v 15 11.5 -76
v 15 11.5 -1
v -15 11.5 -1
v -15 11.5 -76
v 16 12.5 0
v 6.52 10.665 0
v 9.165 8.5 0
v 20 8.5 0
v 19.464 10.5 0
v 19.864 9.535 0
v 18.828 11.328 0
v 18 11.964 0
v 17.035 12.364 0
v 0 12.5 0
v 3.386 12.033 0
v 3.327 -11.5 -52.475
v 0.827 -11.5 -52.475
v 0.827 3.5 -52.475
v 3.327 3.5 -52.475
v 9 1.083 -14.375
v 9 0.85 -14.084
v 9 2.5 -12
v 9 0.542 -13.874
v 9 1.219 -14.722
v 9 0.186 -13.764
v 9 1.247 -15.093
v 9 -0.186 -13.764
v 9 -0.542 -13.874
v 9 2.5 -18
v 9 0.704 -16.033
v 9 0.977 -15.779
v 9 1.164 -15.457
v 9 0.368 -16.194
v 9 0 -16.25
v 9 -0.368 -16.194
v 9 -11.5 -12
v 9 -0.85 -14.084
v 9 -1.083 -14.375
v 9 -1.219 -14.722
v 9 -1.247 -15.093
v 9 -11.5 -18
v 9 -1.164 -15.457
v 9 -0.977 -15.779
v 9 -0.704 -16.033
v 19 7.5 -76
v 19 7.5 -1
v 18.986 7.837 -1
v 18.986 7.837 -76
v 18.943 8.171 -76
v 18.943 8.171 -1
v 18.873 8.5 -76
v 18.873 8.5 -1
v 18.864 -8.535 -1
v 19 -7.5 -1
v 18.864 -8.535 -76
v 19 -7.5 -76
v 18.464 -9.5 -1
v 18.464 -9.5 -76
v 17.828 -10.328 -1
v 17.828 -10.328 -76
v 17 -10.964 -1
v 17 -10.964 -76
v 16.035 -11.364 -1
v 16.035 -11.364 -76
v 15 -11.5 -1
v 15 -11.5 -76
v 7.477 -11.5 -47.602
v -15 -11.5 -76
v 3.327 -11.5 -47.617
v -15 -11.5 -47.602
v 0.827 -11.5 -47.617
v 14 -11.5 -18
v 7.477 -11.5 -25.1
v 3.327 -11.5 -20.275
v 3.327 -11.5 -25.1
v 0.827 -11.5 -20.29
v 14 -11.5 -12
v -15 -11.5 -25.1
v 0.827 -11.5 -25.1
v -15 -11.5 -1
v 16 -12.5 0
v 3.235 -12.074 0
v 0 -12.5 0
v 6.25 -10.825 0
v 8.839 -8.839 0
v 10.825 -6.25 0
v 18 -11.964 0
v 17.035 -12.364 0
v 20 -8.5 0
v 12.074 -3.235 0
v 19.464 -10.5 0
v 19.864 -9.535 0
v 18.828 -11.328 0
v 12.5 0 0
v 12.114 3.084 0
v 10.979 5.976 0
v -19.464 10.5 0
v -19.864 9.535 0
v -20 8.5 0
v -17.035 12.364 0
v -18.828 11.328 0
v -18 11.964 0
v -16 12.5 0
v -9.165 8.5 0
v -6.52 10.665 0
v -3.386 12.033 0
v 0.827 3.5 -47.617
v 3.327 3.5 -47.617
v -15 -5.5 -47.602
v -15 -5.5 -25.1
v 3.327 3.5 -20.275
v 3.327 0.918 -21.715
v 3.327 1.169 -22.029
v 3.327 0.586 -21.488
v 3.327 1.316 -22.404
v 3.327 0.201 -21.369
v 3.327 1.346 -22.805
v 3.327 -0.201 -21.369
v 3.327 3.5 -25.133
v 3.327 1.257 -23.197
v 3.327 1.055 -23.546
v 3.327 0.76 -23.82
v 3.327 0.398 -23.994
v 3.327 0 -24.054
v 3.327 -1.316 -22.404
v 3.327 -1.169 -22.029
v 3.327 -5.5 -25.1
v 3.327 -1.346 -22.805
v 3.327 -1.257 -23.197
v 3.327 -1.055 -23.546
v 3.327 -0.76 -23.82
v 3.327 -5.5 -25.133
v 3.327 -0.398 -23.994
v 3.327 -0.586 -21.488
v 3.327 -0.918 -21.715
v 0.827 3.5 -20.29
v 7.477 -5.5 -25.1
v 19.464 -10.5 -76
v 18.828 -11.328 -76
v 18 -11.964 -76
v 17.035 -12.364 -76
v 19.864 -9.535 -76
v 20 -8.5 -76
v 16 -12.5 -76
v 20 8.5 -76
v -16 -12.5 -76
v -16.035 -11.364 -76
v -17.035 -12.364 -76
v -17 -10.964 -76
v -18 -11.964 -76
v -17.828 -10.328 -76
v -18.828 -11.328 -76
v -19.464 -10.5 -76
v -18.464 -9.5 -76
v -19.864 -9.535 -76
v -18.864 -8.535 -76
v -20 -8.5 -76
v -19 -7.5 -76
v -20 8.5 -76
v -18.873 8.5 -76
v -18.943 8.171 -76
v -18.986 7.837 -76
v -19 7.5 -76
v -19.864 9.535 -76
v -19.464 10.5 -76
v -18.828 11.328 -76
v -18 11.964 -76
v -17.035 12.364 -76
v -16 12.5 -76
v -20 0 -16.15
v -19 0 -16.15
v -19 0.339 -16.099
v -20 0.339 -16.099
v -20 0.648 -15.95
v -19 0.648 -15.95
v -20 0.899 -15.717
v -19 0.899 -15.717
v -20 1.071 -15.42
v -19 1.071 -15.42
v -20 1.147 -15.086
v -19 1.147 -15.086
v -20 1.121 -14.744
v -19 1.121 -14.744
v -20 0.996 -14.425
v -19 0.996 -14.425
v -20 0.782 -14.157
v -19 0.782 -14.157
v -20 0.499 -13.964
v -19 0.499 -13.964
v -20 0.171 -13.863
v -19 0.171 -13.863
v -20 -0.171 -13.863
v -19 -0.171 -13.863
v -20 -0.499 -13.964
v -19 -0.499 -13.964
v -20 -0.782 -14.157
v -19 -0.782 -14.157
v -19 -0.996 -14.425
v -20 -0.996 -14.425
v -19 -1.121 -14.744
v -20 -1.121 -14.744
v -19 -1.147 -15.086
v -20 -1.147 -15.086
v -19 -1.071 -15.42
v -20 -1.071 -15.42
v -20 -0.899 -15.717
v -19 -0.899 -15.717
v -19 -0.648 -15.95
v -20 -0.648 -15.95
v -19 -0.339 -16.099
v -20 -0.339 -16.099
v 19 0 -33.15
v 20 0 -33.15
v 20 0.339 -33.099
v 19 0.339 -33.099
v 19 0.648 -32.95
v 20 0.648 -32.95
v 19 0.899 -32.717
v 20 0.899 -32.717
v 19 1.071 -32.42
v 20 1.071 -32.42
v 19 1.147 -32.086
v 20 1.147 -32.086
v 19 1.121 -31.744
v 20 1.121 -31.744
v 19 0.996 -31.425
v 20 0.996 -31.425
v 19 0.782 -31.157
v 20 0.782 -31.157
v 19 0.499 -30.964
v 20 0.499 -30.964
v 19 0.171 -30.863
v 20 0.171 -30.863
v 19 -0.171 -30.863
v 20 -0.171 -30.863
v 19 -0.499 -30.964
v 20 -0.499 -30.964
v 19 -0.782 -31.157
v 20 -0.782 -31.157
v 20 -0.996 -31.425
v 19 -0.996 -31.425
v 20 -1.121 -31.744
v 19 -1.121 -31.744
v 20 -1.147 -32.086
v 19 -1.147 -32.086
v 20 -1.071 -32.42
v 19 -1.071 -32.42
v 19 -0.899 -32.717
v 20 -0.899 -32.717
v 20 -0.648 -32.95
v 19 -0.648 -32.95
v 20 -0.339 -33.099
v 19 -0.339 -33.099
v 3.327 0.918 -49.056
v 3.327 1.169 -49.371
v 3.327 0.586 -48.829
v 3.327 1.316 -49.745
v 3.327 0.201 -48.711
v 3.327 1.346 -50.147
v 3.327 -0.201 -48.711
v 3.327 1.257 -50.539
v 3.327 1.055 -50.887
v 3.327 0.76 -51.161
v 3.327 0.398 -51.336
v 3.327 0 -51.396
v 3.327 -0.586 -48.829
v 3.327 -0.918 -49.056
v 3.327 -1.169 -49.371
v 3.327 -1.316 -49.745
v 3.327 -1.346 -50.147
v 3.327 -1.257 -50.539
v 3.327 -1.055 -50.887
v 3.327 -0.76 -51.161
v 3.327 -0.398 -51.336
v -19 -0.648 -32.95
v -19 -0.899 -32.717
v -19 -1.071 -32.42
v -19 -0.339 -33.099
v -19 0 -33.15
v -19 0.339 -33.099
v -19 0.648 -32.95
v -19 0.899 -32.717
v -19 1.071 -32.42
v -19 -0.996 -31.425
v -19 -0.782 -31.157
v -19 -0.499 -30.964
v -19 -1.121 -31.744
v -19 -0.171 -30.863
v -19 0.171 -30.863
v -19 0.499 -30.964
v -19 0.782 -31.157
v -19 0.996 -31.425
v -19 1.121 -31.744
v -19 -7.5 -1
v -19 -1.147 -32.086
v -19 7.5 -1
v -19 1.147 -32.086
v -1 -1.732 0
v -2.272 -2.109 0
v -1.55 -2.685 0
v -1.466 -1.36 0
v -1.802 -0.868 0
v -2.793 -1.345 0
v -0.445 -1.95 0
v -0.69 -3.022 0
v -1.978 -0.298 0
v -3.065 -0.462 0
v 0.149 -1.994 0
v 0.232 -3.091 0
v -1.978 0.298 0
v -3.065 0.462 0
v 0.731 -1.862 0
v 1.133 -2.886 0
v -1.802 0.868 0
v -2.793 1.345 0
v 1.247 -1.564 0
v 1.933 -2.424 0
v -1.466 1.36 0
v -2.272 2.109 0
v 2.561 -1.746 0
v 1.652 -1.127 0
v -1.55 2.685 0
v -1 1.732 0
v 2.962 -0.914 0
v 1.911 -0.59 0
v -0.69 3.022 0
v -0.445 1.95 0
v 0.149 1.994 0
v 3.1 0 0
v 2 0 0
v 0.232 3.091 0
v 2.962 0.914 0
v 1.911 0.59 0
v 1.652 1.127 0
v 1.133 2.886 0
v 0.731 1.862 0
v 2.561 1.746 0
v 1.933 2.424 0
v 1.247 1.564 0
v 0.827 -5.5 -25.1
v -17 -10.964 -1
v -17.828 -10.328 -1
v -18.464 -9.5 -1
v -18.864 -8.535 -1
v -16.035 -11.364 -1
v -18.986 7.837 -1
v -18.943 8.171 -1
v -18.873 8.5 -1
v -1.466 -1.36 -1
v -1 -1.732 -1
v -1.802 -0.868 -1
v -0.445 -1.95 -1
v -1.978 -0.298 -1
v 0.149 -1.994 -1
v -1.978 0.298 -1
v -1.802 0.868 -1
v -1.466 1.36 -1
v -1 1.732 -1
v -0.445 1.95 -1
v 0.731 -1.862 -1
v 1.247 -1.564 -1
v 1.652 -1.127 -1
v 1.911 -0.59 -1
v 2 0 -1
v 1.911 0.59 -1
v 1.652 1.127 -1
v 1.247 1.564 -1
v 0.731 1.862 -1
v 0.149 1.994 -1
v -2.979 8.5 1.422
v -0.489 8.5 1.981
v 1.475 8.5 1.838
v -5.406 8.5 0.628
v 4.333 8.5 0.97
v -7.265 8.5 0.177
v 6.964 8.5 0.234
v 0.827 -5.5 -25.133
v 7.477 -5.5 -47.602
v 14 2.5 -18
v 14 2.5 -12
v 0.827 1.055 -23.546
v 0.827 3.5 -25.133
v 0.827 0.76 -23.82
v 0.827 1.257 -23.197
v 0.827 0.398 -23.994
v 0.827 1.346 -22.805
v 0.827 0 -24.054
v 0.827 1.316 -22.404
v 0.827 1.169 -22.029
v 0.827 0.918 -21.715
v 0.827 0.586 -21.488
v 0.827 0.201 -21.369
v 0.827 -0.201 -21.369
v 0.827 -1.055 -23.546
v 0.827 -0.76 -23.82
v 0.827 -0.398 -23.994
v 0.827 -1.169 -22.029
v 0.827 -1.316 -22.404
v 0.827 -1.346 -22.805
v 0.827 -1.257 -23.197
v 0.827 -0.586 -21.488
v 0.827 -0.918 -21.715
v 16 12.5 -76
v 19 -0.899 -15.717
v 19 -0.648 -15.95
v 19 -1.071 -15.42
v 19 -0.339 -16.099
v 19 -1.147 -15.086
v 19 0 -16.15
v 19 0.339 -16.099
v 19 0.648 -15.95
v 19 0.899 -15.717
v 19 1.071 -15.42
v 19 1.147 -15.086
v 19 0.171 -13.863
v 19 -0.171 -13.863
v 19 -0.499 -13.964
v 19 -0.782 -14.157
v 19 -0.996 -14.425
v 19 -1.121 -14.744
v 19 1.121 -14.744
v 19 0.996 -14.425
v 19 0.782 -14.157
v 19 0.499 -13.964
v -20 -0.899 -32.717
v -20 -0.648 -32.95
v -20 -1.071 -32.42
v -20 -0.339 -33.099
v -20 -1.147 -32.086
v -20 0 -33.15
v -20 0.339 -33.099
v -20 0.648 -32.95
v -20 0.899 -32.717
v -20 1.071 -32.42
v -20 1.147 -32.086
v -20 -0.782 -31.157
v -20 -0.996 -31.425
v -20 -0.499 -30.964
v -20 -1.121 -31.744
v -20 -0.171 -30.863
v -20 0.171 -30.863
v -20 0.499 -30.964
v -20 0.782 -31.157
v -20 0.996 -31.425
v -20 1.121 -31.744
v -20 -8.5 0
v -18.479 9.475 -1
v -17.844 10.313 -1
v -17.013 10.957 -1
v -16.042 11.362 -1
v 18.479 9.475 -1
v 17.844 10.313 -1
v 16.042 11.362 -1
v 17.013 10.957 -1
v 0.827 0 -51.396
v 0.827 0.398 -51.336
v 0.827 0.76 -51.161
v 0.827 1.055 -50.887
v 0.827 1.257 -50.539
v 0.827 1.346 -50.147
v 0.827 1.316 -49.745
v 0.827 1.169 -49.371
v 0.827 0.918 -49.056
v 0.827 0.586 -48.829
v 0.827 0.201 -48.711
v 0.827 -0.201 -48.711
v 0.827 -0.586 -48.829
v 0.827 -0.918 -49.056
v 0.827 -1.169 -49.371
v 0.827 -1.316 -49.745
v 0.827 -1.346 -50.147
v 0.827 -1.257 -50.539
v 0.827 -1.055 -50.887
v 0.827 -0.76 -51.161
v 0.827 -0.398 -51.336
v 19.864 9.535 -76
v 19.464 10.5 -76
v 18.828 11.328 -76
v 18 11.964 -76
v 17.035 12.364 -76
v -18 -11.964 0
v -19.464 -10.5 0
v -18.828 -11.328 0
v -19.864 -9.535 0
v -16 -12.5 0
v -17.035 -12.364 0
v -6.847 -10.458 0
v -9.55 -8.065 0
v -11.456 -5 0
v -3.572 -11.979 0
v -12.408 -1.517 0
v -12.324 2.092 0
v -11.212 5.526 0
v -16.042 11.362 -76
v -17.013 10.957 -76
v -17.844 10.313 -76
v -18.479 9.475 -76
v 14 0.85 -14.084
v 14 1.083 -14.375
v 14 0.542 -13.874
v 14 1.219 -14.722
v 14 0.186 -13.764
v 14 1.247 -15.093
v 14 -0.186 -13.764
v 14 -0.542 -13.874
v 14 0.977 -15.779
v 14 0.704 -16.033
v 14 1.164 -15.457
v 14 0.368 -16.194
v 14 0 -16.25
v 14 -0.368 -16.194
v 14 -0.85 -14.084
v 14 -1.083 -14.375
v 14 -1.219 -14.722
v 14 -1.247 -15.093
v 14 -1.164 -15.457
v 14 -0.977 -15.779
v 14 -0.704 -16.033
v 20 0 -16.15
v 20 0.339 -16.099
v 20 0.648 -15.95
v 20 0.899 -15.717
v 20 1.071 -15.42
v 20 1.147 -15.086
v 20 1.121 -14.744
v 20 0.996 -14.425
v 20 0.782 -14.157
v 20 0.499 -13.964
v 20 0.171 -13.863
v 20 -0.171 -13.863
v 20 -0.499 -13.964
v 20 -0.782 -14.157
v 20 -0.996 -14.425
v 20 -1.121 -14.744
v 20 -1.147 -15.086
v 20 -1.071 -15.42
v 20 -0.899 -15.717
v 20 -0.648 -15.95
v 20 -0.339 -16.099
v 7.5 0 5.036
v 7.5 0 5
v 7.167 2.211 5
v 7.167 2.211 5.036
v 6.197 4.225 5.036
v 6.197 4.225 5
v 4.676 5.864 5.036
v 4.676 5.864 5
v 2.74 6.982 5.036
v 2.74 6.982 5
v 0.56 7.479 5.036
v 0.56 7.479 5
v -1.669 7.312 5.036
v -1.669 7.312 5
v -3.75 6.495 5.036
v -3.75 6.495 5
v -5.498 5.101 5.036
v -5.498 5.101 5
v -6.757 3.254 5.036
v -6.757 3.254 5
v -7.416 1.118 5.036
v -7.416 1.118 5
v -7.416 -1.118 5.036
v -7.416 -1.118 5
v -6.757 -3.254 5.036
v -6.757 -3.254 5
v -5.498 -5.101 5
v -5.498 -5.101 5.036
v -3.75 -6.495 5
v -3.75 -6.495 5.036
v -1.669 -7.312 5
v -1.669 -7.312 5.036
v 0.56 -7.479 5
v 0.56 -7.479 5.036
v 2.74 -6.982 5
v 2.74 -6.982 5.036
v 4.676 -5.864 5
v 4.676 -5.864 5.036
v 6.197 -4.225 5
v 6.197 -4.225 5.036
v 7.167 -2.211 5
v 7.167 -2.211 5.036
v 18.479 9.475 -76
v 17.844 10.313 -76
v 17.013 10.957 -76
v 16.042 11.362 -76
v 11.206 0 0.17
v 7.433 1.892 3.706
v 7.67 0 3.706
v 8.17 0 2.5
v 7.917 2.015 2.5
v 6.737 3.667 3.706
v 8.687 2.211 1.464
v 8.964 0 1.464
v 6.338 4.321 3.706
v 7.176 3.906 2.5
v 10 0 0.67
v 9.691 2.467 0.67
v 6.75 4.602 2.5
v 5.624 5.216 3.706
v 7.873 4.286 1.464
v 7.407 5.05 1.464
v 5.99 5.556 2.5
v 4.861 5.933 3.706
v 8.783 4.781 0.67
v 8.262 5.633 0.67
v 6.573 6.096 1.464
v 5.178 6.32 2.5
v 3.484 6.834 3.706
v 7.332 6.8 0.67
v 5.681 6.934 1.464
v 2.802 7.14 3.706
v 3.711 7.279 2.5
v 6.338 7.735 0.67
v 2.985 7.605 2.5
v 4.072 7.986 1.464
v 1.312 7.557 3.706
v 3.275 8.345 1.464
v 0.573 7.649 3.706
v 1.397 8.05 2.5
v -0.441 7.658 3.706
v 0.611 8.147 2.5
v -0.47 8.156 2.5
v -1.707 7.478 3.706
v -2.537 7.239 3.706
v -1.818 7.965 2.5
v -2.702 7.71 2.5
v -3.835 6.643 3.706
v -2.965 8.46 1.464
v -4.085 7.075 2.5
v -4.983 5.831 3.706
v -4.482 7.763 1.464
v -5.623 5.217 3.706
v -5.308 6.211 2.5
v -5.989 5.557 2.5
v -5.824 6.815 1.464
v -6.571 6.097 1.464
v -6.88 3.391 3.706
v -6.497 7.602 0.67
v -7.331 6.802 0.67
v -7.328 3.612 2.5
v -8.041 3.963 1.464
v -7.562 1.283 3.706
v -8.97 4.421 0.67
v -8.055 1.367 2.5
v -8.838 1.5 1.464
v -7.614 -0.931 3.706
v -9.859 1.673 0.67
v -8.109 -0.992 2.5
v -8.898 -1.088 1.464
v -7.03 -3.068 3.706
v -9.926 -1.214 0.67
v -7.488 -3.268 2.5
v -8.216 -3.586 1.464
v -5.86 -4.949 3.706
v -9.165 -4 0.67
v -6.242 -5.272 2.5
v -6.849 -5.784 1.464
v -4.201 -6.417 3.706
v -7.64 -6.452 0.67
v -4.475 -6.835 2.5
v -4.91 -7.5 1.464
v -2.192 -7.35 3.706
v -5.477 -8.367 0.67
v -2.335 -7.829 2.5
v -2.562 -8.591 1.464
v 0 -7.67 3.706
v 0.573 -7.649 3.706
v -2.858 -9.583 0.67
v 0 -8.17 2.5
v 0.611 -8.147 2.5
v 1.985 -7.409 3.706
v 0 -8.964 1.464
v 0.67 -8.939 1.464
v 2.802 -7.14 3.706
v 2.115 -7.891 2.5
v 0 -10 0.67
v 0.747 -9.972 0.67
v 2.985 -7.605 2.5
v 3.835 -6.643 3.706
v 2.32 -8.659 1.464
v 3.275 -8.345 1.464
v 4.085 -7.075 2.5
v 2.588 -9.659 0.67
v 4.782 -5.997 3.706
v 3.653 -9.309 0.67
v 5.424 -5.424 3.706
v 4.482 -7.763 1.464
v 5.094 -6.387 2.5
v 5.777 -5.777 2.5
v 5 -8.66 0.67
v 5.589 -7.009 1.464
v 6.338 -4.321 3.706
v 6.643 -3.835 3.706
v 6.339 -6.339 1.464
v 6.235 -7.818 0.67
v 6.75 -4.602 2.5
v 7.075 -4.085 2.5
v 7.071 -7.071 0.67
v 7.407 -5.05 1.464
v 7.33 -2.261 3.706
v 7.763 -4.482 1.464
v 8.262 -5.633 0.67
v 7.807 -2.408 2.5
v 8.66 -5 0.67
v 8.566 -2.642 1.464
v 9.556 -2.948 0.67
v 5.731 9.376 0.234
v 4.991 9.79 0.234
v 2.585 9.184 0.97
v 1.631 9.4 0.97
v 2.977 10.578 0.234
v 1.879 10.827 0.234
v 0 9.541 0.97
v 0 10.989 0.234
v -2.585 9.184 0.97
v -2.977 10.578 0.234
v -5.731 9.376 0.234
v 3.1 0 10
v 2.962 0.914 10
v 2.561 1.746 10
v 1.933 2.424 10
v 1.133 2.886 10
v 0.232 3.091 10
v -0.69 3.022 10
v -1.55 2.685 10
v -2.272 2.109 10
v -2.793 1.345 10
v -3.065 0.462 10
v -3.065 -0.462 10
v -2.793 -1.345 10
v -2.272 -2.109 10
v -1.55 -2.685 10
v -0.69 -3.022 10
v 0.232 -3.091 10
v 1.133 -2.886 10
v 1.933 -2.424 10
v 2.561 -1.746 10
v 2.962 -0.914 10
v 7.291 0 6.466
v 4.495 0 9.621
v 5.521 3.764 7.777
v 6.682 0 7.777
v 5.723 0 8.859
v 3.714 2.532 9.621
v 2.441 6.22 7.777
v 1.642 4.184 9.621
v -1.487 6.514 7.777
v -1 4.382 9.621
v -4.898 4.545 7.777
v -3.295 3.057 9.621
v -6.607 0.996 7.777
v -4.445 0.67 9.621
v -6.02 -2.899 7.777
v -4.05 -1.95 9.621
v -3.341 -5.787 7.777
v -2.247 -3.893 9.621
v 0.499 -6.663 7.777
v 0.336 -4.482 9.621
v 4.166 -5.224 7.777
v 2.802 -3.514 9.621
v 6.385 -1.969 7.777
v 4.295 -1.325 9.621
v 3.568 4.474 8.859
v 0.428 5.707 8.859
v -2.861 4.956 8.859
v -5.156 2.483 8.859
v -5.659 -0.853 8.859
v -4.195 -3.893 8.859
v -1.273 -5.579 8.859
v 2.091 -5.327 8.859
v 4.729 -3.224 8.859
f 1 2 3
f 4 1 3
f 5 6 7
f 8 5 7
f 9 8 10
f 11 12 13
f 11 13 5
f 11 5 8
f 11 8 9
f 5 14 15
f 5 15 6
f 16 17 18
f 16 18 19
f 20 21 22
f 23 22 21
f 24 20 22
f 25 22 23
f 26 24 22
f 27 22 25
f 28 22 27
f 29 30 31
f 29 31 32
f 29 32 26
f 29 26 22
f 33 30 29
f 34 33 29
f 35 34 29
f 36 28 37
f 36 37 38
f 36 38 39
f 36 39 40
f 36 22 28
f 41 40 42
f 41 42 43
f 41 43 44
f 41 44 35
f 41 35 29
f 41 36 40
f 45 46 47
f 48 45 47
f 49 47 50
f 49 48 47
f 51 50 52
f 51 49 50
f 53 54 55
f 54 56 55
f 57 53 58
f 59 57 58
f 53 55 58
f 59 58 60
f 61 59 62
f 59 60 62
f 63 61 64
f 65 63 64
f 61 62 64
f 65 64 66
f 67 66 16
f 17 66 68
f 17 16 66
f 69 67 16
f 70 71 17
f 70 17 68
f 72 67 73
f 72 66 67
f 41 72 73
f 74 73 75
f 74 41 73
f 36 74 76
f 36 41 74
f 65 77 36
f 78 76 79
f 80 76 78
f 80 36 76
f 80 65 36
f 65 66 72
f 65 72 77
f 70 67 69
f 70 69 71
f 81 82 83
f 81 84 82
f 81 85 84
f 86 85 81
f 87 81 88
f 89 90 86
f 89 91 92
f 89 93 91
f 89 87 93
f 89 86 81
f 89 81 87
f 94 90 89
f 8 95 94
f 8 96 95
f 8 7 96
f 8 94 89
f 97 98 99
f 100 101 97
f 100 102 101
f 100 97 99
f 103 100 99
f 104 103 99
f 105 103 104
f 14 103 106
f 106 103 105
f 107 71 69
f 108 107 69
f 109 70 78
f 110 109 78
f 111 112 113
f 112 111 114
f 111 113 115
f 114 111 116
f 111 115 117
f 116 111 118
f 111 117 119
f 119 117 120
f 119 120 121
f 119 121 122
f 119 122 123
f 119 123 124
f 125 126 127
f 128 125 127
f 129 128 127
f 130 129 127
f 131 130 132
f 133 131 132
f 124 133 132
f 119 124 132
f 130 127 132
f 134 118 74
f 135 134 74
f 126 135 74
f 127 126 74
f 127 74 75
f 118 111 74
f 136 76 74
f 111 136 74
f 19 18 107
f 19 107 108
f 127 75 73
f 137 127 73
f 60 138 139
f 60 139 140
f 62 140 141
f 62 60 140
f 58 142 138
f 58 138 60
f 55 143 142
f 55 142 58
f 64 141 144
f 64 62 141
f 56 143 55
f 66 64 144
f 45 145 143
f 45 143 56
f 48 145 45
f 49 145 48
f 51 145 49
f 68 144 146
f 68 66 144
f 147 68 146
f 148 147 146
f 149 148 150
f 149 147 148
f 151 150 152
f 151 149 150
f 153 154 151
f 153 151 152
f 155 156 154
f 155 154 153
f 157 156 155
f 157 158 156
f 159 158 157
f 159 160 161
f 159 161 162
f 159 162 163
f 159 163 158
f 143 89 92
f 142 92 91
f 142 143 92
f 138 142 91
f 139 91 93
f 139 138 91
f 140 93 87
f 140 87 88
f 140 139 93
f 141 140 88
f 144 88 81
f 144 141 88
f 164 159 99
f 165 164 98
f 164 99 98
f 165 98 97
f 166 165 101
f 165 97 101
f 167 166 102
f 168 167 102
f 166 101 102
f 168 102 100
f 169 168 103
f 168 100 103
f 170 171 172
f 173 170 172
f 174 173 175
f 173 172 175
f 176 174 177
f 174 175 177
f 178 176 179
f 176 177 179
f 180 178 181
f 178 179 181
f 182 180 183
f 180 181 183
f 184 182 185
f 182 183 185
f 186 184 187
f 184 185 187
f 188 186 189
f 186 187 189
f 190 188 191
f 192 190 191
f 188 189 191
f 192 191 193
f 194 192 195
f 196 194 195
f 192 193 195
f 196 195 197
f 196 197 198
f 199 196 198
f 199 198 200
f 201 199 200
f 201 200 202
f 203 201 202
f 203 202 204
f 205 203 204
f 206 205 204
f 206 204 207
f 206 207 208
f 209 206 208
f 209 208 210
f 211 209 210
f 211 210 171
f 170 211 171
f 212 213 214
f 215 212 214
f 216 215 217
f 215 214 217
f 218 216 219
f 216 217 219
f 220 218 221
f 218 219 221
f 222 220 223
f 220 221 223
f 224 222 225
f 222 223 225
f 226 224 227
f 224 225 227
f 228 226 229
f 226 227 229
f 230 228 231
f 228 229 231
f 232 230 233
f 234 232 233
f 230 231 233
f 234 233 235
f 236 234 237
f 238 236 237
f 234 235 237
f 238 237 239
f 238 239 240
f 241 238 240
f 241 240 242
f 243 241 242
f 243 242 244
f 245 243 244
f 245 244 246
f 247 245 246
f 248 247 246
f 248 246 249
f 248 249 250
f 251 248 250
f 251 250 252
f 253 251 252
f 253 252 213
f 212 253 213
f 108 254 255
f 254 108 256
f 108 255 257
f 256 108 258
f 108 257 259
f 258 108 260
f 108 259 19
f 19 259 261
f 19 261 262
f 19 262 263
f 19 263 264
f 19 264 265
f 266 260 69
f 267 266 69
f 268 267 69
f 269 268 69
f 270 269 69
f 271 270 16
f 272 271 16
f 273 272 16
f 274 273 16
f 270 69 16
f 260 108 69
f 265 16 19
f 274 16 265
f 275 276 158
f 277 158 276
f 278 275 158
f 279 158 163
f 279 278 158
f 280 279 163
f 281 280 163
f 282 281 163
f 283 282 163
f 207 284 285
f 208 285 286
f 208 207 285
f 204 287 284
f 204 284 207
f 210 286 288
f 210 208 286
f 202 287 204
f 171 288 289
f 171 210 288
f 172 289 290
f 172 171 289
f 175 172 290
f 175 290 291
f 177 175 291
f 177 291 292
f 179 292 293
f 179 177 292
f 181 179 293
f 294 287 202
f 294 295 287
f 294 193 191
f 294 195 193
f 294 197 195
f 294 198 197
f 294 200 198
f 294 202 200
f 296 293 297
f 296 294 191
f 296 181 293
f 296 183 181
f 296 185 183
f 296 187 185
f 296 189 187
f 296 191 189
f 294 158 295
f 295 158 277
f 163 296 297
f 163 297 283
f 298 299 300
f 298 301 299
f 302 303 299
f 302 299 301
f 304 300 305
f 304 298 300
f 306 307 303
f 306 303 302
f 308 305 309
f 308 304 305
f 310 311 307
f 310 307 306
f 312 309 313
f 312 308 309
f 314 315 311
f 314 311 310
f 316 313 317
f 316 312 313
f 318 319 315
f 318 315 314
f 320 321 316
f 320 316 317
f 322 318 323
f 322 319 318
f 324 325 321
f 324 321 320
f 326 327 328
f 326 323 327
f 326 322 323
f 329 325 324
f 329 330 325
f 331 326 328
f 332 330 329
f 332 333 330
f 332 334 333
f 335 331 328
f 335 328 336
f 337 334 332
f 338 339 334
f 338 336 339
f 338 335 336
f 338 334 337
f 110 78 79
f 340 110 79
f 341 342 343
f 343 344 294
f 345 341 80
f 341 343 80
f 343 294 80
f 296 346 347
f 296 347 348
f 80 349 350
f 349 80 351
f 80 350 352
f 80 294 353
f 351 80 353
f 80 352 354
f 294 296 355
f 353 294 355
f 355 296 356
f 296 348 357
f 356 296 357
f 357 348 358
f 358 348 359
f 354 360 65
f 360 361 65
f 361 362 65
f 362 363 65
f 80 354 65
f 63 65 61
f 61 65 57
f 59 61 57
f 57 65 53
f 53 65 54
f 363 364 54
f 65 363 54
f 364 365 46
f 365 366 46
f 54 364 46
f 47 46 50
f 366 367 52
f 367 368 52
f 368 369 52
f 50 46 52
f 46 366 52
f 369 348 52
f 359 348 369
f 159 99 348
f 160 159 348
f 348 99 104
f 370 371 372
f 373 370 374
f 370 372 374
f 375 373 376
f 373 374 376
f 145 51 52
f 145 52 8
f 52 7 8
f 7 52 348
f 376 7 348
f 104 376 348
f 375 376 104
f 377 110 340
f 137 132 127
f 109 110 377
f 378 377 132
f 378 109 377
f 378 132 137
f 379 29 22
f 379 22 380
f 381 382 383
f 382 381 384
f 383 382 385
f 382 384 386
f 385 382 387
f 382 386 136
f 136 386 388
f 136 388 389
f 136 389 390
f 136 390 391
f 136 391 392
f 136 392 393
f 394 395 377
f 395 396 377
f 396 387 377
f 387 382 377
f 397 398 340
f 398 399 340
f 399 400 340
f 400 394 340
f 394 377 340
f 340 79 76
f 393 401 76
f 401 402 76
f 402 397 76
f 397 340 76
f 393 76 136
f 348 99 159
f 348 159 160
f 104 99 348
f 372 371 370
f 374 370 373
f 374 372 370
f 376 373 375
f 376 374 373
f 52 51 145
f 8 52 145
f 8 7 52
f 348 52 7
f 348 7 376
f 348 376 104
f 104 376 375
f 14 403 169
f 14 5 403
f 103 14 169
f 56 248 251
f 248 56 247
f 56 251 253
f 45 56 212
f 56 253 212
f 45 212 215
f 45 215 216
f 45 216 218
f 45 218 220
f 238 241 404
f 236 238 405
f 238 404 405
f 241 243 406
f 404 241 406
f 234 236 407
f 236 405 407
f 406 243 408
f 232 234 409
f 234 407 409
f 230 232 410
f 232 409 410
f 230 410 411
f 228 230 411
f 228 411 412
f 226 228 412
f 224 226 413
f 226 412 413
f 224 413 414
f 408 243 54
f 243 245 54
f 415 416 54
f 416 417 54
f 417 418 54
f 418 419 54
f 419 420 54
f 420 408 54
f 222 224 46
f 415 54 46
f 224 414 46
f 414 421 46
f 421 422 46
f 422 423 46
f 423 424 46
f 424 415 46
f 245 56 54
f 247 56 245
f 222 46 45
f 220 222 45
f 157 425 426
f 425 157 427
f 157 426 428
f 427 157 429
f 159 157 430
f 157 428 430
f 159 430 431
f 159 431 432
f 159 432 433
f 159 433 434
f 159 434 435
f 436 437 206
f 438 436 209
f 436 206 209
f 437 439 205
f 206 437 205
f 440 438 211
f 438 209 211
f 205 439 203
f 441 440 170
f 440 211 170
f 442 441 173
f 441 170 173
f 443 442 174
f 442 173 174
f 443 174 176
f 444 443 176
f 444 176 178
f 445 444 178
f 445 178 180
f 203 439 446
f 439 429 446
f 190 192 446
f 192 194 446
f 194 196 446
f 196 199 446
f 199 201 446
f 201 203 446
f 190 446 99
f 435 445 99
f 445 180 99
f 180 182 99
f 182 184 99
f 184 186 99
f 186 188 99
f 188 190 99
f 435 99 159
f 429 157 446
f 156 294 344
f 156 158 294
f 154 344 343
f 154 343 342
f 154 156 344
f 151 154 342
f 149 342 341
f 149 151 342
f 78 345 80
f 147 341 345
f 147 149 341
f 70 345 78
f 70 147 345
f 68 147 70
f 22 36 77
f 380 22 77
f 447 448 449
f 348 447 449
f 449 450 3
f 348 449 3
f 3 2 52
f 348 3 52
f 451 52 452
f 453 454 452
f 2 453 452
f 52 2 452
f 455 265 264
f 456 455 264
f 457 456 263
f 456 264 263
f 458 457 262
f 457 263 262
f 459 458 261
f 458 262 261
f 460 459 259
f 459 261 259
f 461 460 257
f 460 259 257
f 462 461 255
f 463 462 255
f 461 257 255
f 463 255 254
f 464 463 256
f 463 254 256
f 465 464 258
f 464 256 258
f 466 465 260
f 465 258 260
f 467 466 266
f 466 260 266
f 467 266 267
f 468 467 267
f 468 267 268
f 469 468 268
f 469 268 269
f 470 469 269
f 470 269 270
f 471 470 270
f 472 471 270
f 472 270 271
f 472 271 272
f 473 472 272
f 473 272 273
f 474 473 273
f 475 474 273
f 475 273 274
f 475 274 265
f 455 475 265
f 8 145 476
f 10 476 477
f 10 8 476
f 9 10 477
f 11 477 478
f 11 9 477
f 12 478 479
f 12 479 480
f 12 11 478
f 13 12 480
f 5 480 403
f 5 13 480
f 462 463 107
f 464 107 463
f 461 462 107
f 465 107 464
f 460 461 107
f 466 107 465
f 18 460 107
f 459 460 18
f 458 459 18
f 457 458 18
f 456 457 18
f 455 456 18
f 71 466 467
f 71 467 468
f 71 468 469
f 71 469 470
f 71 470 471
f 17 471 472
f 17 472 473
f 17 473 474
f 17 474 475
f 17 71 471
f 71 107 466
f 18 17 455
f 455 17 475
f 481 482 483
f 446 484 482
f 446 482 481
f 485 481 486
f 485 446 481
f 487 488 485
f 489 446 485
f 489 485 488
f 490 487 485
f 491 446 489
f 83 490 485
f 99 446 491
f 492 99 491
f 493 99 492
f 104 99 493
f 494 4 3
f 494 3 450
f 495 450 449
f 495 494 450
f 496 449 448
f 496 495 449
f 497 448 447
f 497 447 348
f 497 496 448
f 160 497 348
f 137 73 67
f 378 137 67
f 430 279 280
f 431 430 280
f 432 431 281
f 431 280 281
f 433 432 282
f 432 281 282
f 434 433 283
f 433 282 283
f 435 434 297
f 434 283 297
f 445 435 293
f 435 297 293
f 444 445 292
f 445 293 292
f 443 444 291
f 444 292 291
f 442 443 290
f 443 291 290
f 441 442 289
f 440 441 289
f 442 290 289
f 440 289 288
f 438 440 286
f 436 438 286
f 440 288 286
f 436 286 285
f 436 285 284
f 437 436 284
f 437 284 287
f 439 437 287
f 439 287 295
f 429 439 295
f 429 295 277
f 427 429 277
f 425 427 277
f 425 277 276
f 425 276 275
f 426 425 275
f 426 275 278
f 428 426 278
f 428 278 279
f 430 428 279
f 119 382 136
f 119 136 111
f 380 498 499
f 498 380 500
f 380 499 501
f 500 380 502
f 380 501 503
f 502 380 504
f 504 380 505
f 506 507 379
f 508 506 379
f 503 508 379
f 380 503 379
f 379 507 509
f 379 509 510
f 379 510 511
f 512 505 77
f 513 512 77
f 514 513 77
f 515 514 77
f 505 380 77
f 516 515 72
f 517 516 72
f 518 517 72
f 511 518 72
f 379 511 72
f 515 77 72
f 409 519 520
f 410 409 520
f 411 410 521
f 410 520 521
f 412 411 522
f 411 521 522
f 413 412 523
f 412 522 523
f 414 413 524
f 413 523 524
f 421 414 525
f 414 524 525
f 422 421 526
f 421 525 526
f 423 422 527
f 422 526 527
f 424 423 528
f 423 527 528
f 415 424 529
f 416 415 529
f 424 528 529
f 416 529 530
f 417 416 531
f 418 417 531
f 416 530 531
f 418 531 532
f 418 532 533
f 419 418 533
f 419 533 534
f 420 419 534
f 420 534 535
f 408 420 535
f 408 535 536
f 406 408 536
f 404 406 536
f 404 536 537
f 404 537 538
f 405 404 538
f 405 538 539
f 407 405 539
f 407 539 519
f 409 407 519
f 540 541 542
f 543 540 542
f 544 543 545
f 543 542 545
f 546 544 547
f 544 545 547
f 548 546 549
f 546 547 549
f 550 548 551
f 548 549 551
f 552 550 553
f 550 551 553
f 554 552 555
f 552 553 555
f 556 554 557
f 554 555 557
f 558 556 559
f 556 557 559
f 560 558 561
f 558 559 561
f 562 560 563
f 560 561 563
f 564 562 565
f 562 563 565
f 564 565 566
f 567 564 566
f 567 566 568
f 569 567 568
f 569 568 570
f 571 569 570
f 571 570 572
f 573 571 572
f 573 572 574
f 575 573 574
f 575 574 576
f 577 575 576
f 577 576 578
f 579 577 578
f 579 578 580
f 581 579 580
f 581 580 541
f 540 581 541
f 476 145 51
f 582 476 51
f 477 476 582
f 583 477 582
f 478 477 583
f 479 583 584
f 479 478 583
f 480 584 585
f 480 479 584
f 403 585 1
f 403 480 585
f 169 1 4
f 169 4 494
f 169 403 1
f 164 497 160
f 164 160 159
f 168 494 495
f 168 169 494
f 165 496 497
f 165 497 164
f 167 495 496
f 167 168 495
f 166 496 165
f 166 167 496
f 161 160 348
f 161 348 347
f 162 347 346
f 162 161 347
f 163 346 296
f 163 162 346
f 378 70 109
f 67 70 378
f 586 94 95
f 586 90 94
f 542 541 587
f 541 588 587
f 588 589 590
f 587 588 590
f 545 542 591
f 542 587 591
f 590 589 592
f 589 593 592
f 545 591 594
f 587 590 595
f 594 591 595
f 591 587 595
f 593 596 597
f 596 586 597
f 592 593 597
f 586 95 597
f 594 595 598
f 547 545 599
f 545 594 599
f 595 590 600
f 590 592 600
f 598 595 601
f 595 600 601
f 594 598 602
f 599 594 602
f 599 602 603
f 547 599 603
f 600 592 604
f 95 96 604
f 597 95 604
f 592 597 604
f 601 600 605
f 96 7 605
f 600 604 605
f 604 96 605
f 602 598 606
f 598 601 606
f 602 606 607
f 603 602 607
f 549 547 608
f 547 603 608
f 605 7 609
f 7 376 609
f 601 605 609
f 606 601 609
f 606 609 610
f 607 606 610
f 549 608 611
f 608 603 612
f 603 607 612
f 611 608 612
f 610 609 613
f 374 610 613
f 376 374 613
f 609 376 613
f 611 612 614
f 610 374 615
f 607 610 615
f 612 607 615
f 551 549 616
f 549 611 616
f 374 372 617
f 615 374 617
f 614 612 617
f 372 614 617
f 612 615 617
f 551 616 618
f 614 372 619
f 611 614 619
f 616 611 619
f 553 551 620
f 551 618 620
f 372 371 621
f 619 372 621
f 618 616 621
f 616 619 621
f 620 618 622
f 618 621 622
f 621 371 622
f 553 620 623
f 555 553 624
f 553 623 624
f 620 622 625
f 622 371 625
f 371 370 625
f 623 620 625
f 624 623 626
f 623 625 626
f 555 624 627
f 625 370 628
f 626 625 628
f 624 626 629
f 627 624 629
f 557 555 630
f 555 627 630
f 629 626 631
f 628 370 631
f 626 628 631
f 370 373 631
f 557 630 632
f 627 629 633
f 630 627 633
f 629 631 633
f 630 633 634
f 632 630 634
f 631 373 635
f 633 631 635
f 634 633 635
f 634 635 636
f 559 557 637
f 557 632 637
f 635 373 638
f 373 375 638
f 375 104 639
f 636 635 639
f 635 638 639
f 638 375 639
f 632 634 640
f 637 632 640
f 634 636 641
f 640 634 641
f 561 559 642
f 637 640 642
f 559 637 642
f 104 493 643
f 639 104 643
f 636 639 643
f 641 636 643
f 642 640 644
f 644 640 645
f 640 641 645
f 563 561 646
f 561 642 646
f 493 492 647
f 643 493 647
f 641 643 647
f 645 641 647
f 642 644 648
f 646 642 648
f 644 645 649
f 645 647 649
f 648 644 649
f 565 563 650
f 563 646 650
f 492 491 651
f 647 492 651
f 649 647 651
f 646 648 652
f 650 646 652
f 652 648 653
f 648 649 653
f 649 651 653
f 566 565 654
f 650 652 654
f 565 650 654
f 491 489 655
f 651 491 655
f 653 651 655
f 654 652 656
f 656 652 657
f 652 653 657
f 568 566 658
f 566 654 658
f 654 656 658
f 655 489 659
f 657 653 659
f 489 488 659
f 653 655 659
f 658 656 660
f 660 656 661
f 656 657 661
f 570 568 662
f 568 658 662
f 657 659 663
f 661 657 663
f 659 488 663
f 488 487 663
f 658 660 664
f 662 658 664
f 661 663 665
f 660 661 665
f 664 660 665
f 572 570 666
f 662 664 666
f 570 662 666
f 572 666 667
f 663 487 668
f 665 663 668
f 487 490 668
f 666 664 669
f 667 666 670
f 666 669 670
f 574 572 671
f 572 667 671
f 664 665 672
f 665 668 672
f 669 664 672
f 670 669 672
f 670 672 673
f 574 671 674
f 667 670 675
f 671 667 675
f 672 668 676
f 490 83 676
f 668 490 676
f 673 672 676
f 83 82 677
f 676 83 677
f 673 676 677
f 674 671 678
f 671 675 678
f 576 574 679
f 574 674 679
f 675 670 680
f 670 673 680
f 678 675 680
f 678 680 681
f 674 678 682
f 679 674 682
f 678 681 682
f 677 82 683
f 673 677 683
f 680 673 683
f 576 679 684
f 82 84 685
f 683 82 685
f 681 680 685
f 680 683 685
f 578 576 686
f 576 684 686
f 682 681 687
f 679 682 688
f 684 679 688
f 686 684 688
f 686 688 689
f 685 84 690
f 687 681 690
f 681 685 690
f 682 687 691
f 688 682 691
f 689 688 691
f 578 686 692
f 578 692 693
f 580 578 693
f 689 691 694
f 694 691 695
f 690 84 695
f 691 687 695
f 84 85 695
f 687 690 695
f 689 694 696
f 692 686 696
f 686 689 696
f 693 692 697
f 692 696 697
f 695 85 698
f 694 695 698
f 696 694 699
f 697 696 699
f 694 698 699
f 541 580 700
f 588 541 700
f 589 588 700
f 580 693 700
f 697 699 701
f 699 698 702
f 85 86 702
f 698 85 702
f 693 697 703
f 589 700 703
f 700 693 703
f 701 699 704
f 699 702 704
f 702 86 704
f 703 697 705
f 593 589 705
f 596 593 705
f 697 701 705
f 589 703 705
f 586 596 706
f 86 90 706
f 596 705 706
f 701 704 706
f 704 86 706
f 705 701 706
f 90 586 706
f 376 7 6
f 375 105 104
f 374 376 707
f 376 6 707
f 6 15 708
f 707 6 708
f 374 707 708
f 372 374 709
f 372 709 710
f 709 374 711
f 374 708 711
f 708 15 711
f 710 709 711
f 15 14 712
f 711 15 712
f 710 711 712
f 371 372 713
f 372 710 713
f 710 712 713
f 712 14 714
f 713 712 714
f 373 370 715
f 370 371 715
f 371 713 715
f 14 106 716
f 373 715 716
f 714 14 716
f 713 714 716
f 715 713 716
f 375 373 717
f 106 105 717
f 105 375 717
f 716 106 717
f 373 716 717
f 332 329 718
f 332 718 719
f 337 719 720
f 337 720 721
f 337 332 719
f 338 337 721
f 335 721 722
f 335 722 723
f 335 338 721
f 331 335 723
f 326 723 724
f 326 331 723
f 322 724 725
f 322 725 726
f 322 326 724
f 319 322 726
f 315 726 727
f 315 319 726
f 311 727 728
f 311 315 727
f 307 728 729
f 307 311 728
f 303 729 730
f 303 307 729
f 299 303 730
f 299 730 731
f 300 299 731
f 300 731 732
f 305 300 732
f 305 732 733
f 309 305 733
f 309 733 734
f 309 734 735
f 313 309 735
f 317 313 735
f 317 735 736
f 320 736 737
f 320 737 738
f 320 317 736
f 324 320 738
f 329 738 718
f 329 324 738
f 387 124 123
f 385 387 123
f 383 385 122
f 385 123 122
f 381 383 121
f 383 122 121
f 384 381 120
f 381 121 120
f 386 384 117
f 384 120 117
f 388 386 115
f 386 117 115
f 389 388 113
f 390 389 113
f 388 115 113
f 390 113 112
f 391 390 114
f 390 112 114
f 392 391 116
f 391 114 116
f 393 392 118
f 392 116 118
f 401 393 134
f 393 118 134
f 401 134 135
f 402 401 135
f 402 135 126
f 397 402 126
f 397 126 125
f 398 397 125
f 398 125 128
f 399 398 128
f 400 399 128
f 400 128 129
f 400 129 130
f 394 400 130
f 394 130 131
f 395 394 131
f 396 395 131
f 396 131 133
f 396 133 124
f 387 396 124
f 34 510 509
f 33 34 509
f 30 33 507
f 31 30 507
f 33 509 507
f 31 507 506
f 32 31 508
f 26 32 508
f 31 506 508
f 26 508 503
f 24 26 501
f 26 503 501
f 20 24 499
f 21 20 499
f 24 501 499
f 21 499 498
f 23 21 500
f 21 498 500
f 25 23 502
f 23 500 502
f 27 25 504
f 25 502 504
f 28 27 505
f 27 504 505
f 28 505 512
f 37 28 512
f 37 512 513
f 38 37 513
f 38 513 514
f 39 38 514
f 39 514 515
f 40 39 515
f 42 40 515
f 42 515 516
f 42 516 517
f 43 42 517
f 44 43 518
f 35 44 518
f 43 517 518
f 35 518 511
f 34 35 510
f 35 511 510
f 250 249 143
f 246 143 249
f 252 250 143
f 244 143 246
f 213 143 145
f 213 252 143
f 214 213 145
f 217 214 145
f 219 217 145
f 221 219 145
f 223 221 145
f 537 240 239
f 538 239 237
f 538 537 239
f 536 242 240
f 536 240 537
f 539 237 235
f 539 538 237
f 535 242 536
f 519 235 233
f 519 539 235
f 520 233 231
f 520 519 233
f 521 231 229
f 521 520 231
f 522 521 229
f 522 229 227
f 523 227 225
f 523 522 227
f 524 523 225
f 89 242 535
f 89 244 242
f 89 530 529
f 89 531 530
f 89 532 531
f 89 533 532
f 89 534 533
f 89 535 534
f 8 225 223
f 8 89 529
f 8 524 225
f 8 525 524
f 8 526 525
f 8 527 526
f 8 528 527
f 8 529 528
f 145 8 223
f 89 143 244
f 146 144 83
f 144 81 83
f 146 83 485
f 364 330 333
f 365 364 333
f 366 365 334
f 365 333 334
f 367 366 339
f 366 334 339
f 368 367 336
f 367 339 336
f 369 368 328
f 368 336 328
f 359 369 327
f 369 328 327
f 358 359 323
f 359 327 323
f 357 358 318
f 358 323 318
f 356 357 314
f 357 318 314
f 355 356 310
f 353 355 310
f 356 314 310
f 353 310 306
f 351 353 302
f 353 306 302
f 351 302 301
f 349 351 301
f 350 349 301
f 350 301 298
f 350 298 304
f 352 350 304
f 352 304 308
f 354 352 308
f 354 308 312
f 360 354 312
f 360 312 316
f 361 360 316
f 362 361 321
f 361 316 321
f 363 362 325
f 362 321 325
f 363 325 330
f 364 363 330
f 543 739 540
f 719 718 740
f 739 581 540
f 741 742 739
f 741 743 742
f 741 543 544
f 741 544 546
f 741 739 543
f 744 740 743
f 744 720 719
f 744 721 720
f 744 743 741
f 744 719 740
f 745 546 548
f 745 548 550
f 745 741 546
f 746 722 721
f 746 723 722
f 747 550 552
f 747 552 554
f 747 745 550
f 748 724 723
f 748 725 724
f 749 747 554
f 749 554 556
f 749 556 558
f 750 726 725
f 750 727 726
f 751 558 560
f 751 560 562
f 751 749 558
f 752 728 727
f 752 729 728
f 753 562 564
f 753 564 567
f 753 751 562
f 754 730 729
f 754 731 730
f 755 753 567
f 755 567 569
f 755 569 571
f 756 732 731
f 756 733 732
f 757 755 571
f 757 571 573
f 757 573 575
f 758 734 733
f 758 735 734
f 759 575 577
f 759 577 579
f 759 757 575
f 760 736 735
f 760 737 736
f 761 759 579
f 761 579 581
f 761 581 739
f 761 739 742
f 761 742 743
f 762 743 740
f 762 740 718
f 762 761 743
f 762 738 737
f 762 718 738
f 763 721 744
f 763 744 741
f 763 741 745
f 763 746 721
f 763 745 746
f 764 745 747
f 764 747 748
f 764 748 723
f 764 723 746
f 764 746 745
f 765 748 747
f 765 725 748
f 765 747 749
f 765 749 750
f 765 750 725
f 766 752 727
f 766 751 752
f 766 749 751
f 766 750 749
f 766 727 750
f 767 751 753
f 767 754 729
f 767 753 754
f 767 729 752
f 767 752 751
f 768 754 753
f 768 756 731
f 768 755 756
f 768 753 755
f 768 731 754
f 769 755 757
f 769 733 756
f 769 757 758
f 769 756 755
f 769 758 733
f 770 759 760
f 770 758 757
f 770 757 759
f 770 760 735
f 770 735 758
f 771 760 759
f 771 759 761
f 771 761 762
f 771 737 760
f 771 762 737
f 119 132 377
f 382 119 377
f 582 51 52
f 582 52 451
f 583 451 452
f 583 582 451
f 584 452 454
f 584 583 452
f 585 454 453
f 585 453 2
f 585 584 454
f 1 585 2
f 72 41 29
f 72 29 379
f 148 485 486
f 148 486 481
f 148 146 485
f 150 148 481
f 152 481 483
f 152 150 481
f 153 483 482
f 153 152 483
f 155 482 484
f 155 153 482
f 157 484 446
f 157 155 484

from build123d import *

# Parameters (mm, degrees)
SKETCH1_W              = 40
SKETCH1_H              = 25
SKETCH1_R              = 2
BOSS_EXTRUDE1_DEPTH    = 1
SKETCH2_W              = 40
SKETCH2_H              = 25
SKETCH2_W_2            = 38
SKETCH2_H_2            = 23
BOSS_EXTRUDE2_DEPTH    = 75
FILLET2_R              = 4
SKETCH4_R              = 7.5
SKETCH4_R_2            = 3.1
BOSS_EXTRUDE3_DEPTH    = 10
FILLET3_R              = 5
SKETCH5_R              = 1.15
CUT_EXTRUDE1_DEPTH     = 87.788536109
SKETCH10_W             = 22.476776695
SKETCH10_H             = 7.4
SKETCH10_H_2           = 15.101776695
BOSS_EXTRUDE4_DEPTH    = 6
SKETCH12_W             = 2.5
SKETCH12_H             = 4.858493649
BOSS_EXTRUDE5_DEPTH    = 15
SKETCH13_R             = 1.35
CUT_EXTRUDE3_DEPTH     = 12
SKETCH15_W             = 5
SKETCH15_H             = 6
BOSS_EXTRUDE6_DEPTH    = 14
SKETCH16_R             = 1.25
CUT_EXTRUDE4_DEPTH     = 5
SPLIT1_SURFACE_1_BACK  = 99.087
SPLIT1_SURFACE_1_DEPTH = 198.174
SPLIT1_SURFACE_2_BACK  = 99.087
SPLIT1_SURFACE_2_DEPTH = 198.174


with BuildPart() as part:
    # Sketch1 → Boss-Extrude1 (new body)
    with BuildSketch(Plane.XY):
        Rectangle(SKETCH1_W, SKETCH1_H)
        Circle(SKETCH1_R, mode=Mode.SUBTRACT)
    extrude(amount=-BOSS_EXTRUDE1_DEPTH)

    # Sketch2 → Boss-Extrude2 (add)
    with BuildSketch(Plane(origin=(0, 0, -1), x_dir=(-1, 0, 0), z_dir=(0, 0, -1))):
        Rectangle(SKETCH2_W, SKETCH2_H)
        Rectangle(SKETCH2_W_2, SKETCH2_H_2, mode=Mode.SUBTRACT)
    extrude(amount=BOSS_EXTRUDE2_DEPTH)

    # Fillet2
    fillet2_edges = [part.edges().sort_by_distance(p)[0] for p in [
        (-19, 11.5, -38.5),
        (19, 11.5, -38.5),
        (19, -11.5, -38.5),
        (-19, -11.5, -38.5),
        (20, -12.5, -38),
        (-20, -12.5, -38),
        (-20, 12.5, -38),
        (20, 12.5, -38),
    ]]
    fillet(fillet2_edges, radius=FILLET2_R)

    # Sketch4 → Boss-Extrude3 (add)
    with BuildSketch(Plane.XY):
        Circle(SKETCH4_R)
        Circle(SKETCH4_R_2, mode=Mode.SUBTRACT)
    extrude(amount=BOSS_EXTRUDE3_DEPTH)

    # Fillet3
    # the kernel refuses this fillet: 5 mm, written as the material it adds along each edge
    with BuildSketch(Plane(origin=(0, 0, 0), x_dir=(1, 0, 0), z_dir=(0, -1, 0))) as fillet3_piece_1:
        with BuildLine():
            CenterArc((7.5 + FILLET3_R, FILLET3_R), FILLET3_R, 180, 90)
            Line((7.5, FILLET3_R), (7.5, 0))
            Line((7.5, 0), (7.5 + FILLET3_R, 0))
        make_face()
    revolve(axis=Axis((0, 0, 0), (0, 0, 1)))
    # the kernel refuses this fillet: 5 mm, written as the material it takes off along each edge
    with BuildSketch(Plane(origin=(0, 0, 10), x_dir=(1, 0, 0), z_dir=(0, -1, 0))) as fillet3_2_piece_1:
        with BuildLine():
            CenterArc((2.5, -4.963869458), FILLET3_R, 0, 83.107897421)
            Line((3.1, 0), (7.5, 0))
            Line((7.5, 0), (7.5, -4.963869458))
        make_face()
    revolve(axis=Axis((0, 0, 10), (0, 0, 1)), mode=Mode.SUBTRACT)

    # Sketch5 → Cut-Extrude1 (cut, through all)
    with BuildSketch(Plane(origin=(20, 0, 0), x_dir=(0, 0, -1), z_dir=(1, 0, 0))):
        with Locations((15, 0)):
            Circle(SKETCH5_R)
        with Locations((32, 0)):
            Circle(SKETCH5_R)
    extrude(amount=-CUT_EXTRUDE1_DEPTH, mode=Mode.SUBTRACT)

    # Sketch10 → Boss-Extrude4 (add)
    with BuildSketch(Plane(origin=(0, -11.5, 0), x_dir=(1, 0, 0), z_dir=(0, 1, 0))):
        with Locations((-3.761611653, 28.8)):
            Rectangle(SKETCH10_W, SKETCH10_H)
        with Locations((-3.761611653, 40.050888348)):
            Rectangle(SKETCH10_W, SKETCH10_H_2)
    extrude(amount=BOSS_EXTRUDE4_DEPTH)

    # Sketch12 → Boss-Extrude5 (add)
    with BuildSketch(Plane(origin=(0, -11.5, 0), x_dir=(1, 0, 0), z_dir=(0, 1, 0))):
        with Locations((2.076776695, 50.045753176)):
            Rectangle(SKETCH12_W, SKETCH12_H)
        Polygon((3.326776695, 25.133493649), (0.826776695, 25.133493649), (0.826776695, 20.289638402), (3.326776695, 20.275), align=None)
    extrude(amount=BOSS_EXTRUDE5_DEPTH)

    # Sketch13 → Cut-Extrude3 (cut)
    with BuildSketch(Plane(origin=(3.326776695, 0, 0), x_dir=(0, 0, -1), z_dir=(1, 0, 0))):
        with Locations((22.704246825, 0)):
            Circle(SKETCH13_R)
        with Locations((50.045753175, 0)):
            Circle(SKETCH13_R)
    extrude(amount=-CUT_EXTRUDE3_DEPTH, mode=Mode.SUBTRACT)

    # Sketch15 → Boss-Extrude6 (add)
    with BuildSketch(Plane(origin=(0, -11.5, 0), x_dir=(1, 0, 0), z_dir=(0, 1, 0))):
        with Locations((11.5, 15)):
            Rectangle(SKETCH15_W, SKETCH15_H)
    extrude(amount=BOSS_EXTRUDE6_DEPTH)

    # Sketch16 → Cut-Extrude4 (cut)
    with BuildSketch(Plane(origin=(14, 0, 0), x_dir=(0, 0, -1), z_dir=(1, 0, 0))):
        with Locations((15, 0)):
            Circle(SKETCH16_R)
    extrude(amount=-CUT_EXTRUDE4_DEPTH, mode=Mode.SUBTRACT)


with BuildPart() as body_2:
    # Split1: the piece behind the surface
    add(part.part)
    # Split1 surface: a surface, the sketch's curves swept straight by 198.174 mm
    with BuildLine(Plane(origin=(0, 0, -76), x_dir=(-1, 0, 0), z_dir=(0, 0, -1)).offset(-SPLIT1_SURFACE_1_BACK), mode=Mode.PRIVATE) as split1_surface_1_path:
        Line((20, 8.5), (-20, 8.5))
    split1_surface_1 = Shell.extrude(split1_surface_1_path.wire(), (0 * SPLIT1_SURFACE_1_DEPTH, 0 * SPLIT1_SURFACE_1_DEPTH, -1 * SPLIT1_SURFACE_1_DEPTH))
    split(bisect_by=split1_surface_1, keep=Keep.BOTTOM)


with BuildPart() as part_1:
    add(part.part)

    # Split1: split by a surface, the side it looks to stays
    # Split1 surface: a surface, the sketch's curves swept straight by 198.174 mm
    with BuildLine(Plane(origin=(0, 0, -76), x_dir=(-1, 0, 0), z_dir=(0, 0, -1)).offset(-SPLIT1_SURFACE_2_BACK), mode=Mode.PRIVATE) as split1_surface_2_path:
        Line((20, 8.5), (-20, 8.5))
    split1_surface_2 = Shell.extrude(split1_surface_2_path.wire(), (0 * SPLIT1_SURFACE_2_DEPTH, 0 * SPLIT1_SURFACE_2_DEPTH, -1 * SPLIT1_SURFACE_2_DEPTH))
    split(bisect_by=split1_surface_2, keep=Keep.TOP)


solid = Compound([body_2.part, part_1.part])
